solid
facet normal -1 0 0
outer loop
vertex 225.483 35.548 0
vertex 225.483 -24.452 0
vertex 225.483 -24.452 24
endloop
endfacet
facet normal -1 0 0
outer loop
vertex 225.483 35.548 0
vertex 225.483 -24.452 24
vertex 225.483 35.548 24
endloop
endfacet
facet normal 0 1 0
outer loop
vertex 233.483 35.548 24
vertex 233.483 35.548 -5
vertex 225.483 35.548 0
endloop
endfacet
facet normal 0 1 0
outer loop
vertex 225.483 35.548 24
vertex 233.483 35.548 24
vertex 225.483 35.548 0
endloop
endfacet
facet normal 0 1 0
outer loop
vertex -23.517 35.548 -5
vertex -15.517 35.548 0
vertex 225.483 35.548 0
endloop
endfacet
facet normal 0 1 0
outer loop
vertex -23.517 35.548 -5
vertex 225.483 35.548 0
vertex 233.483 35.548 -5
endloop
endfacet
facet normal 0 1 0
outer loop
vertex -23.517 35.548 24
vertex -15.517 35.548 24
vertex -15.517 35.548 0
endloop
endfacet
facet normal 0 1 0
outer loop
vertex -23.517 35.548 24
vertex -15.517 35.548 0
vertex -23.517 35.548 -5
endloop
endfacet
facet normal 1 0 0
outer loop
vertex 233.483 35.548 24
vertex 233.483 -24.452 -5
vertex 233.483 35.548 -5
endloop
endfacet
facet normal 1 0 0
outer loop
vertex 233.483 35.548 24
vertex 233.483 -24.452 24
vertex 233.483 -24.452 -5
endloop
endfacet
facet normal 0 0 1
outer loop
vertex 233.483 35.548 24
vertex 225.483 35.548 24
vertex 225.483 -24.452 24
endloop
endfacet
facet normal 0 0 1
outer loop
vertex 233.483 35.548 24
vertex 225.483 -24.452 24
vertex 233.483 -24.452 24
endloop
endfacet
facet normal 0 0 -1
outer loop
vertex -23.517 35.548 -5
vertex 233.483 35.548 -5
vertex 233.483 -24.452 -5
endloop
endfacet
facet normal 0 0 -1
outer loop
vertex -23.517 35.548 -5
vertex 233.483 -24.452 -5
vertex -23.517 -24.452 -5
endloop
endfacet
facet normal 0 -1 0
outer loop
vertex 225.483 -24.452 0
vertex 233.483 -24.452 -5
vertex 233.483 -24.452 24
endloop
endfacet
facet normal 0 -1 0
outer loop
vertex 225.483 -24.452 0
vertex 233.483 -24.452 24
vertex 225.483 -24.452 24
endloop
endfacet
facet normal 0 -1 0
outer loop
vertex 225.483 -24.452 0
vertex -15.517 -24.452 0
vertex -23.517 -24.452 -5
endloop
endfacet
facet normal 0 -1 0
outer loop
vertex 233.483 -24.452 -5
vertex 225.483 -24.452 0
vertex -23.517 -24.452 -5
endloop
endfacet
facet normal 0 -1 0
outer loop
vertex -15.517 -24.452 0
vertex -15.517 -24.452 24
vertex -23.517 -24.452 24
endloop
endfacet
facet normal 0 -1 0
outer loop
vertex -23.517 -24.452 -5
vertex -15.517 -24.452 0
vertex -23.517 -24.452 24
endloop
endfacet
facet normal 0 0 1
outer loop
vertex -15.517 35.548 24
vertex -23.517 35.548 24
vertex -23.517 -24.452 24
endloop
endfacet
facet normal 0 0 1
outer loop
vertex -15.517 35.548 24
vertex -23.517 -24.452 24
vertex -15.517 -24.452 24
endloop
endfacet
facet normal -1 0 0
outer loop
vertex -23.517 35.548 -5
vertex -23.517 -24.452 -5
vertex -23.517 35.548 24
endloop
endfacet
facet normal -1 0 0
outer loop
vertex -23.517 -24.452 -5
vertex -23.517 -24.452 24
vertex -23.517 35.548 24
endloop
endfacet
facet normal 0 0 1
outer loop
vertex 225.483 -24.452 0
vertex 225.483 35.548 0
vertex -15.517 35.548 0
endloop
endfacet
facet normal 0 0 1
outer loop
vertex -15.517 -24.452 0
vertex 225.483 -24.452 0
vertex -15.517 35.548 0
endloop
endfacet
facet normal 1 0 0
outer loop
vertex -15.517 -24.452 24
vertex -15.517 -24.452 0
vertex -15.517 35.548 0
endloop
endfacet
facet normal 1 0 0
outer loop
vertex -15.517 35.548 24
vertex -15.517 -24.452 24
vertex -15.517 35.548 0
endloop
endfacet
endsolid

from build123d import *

# Parameters (mm, degrees)
SKETCH_2_W        = 8
SKETCH_2_H        = 60
EXTRUDE_1_DEPTH   = 24
EXTRUDE_1_2_DEPTH = 24
SKETCH_3_W        = 257
SKETCH_3_H        = 60
EXTRUDE_2_DEPTH   = 5


with BuildPart() as part:
    # 草图2 → 凸台-拉伸1 (new body)
    with BuildSketch(Plane.XY):
        with Locations((-19.51681736, 5.547854677)):
            Rectangle(SKETCH_2_W, SKETCH_2_H)
    extrude(amount=EXTRUDE_1_DEPTH)



with BuildPart() as body_2:
    # 草图2 → Extrude 1 2 (new body)
    with BuildSketch(Plane.XY):
        with Locations((229.48318264, 5.547854677)):
            Rectangle(SKETCH_2_W, SKETCH_2_H)
    extrude(amount=EXTRUDE_1_2_DEPTH)


with BuildPart() as part_1:
    add(part.part)

    add(body_2.part)  # 凸台-拉伸2 merges body 2
    # 草图3 → 凸台-拉伸2 (add)
    with BuildSketch(Plane(origin=(0, 0, 0), x_dir=(-1, 0, 0), z_dir=(0, 0, -1))):
        with Locations((-104.98318264, 5.547854677)):
            Rectangle(SKETCH_3_W, SKETCH_3_H)
    extrude(amount=EXTRUDE_2_DEPTH)


solid = part_1.part
